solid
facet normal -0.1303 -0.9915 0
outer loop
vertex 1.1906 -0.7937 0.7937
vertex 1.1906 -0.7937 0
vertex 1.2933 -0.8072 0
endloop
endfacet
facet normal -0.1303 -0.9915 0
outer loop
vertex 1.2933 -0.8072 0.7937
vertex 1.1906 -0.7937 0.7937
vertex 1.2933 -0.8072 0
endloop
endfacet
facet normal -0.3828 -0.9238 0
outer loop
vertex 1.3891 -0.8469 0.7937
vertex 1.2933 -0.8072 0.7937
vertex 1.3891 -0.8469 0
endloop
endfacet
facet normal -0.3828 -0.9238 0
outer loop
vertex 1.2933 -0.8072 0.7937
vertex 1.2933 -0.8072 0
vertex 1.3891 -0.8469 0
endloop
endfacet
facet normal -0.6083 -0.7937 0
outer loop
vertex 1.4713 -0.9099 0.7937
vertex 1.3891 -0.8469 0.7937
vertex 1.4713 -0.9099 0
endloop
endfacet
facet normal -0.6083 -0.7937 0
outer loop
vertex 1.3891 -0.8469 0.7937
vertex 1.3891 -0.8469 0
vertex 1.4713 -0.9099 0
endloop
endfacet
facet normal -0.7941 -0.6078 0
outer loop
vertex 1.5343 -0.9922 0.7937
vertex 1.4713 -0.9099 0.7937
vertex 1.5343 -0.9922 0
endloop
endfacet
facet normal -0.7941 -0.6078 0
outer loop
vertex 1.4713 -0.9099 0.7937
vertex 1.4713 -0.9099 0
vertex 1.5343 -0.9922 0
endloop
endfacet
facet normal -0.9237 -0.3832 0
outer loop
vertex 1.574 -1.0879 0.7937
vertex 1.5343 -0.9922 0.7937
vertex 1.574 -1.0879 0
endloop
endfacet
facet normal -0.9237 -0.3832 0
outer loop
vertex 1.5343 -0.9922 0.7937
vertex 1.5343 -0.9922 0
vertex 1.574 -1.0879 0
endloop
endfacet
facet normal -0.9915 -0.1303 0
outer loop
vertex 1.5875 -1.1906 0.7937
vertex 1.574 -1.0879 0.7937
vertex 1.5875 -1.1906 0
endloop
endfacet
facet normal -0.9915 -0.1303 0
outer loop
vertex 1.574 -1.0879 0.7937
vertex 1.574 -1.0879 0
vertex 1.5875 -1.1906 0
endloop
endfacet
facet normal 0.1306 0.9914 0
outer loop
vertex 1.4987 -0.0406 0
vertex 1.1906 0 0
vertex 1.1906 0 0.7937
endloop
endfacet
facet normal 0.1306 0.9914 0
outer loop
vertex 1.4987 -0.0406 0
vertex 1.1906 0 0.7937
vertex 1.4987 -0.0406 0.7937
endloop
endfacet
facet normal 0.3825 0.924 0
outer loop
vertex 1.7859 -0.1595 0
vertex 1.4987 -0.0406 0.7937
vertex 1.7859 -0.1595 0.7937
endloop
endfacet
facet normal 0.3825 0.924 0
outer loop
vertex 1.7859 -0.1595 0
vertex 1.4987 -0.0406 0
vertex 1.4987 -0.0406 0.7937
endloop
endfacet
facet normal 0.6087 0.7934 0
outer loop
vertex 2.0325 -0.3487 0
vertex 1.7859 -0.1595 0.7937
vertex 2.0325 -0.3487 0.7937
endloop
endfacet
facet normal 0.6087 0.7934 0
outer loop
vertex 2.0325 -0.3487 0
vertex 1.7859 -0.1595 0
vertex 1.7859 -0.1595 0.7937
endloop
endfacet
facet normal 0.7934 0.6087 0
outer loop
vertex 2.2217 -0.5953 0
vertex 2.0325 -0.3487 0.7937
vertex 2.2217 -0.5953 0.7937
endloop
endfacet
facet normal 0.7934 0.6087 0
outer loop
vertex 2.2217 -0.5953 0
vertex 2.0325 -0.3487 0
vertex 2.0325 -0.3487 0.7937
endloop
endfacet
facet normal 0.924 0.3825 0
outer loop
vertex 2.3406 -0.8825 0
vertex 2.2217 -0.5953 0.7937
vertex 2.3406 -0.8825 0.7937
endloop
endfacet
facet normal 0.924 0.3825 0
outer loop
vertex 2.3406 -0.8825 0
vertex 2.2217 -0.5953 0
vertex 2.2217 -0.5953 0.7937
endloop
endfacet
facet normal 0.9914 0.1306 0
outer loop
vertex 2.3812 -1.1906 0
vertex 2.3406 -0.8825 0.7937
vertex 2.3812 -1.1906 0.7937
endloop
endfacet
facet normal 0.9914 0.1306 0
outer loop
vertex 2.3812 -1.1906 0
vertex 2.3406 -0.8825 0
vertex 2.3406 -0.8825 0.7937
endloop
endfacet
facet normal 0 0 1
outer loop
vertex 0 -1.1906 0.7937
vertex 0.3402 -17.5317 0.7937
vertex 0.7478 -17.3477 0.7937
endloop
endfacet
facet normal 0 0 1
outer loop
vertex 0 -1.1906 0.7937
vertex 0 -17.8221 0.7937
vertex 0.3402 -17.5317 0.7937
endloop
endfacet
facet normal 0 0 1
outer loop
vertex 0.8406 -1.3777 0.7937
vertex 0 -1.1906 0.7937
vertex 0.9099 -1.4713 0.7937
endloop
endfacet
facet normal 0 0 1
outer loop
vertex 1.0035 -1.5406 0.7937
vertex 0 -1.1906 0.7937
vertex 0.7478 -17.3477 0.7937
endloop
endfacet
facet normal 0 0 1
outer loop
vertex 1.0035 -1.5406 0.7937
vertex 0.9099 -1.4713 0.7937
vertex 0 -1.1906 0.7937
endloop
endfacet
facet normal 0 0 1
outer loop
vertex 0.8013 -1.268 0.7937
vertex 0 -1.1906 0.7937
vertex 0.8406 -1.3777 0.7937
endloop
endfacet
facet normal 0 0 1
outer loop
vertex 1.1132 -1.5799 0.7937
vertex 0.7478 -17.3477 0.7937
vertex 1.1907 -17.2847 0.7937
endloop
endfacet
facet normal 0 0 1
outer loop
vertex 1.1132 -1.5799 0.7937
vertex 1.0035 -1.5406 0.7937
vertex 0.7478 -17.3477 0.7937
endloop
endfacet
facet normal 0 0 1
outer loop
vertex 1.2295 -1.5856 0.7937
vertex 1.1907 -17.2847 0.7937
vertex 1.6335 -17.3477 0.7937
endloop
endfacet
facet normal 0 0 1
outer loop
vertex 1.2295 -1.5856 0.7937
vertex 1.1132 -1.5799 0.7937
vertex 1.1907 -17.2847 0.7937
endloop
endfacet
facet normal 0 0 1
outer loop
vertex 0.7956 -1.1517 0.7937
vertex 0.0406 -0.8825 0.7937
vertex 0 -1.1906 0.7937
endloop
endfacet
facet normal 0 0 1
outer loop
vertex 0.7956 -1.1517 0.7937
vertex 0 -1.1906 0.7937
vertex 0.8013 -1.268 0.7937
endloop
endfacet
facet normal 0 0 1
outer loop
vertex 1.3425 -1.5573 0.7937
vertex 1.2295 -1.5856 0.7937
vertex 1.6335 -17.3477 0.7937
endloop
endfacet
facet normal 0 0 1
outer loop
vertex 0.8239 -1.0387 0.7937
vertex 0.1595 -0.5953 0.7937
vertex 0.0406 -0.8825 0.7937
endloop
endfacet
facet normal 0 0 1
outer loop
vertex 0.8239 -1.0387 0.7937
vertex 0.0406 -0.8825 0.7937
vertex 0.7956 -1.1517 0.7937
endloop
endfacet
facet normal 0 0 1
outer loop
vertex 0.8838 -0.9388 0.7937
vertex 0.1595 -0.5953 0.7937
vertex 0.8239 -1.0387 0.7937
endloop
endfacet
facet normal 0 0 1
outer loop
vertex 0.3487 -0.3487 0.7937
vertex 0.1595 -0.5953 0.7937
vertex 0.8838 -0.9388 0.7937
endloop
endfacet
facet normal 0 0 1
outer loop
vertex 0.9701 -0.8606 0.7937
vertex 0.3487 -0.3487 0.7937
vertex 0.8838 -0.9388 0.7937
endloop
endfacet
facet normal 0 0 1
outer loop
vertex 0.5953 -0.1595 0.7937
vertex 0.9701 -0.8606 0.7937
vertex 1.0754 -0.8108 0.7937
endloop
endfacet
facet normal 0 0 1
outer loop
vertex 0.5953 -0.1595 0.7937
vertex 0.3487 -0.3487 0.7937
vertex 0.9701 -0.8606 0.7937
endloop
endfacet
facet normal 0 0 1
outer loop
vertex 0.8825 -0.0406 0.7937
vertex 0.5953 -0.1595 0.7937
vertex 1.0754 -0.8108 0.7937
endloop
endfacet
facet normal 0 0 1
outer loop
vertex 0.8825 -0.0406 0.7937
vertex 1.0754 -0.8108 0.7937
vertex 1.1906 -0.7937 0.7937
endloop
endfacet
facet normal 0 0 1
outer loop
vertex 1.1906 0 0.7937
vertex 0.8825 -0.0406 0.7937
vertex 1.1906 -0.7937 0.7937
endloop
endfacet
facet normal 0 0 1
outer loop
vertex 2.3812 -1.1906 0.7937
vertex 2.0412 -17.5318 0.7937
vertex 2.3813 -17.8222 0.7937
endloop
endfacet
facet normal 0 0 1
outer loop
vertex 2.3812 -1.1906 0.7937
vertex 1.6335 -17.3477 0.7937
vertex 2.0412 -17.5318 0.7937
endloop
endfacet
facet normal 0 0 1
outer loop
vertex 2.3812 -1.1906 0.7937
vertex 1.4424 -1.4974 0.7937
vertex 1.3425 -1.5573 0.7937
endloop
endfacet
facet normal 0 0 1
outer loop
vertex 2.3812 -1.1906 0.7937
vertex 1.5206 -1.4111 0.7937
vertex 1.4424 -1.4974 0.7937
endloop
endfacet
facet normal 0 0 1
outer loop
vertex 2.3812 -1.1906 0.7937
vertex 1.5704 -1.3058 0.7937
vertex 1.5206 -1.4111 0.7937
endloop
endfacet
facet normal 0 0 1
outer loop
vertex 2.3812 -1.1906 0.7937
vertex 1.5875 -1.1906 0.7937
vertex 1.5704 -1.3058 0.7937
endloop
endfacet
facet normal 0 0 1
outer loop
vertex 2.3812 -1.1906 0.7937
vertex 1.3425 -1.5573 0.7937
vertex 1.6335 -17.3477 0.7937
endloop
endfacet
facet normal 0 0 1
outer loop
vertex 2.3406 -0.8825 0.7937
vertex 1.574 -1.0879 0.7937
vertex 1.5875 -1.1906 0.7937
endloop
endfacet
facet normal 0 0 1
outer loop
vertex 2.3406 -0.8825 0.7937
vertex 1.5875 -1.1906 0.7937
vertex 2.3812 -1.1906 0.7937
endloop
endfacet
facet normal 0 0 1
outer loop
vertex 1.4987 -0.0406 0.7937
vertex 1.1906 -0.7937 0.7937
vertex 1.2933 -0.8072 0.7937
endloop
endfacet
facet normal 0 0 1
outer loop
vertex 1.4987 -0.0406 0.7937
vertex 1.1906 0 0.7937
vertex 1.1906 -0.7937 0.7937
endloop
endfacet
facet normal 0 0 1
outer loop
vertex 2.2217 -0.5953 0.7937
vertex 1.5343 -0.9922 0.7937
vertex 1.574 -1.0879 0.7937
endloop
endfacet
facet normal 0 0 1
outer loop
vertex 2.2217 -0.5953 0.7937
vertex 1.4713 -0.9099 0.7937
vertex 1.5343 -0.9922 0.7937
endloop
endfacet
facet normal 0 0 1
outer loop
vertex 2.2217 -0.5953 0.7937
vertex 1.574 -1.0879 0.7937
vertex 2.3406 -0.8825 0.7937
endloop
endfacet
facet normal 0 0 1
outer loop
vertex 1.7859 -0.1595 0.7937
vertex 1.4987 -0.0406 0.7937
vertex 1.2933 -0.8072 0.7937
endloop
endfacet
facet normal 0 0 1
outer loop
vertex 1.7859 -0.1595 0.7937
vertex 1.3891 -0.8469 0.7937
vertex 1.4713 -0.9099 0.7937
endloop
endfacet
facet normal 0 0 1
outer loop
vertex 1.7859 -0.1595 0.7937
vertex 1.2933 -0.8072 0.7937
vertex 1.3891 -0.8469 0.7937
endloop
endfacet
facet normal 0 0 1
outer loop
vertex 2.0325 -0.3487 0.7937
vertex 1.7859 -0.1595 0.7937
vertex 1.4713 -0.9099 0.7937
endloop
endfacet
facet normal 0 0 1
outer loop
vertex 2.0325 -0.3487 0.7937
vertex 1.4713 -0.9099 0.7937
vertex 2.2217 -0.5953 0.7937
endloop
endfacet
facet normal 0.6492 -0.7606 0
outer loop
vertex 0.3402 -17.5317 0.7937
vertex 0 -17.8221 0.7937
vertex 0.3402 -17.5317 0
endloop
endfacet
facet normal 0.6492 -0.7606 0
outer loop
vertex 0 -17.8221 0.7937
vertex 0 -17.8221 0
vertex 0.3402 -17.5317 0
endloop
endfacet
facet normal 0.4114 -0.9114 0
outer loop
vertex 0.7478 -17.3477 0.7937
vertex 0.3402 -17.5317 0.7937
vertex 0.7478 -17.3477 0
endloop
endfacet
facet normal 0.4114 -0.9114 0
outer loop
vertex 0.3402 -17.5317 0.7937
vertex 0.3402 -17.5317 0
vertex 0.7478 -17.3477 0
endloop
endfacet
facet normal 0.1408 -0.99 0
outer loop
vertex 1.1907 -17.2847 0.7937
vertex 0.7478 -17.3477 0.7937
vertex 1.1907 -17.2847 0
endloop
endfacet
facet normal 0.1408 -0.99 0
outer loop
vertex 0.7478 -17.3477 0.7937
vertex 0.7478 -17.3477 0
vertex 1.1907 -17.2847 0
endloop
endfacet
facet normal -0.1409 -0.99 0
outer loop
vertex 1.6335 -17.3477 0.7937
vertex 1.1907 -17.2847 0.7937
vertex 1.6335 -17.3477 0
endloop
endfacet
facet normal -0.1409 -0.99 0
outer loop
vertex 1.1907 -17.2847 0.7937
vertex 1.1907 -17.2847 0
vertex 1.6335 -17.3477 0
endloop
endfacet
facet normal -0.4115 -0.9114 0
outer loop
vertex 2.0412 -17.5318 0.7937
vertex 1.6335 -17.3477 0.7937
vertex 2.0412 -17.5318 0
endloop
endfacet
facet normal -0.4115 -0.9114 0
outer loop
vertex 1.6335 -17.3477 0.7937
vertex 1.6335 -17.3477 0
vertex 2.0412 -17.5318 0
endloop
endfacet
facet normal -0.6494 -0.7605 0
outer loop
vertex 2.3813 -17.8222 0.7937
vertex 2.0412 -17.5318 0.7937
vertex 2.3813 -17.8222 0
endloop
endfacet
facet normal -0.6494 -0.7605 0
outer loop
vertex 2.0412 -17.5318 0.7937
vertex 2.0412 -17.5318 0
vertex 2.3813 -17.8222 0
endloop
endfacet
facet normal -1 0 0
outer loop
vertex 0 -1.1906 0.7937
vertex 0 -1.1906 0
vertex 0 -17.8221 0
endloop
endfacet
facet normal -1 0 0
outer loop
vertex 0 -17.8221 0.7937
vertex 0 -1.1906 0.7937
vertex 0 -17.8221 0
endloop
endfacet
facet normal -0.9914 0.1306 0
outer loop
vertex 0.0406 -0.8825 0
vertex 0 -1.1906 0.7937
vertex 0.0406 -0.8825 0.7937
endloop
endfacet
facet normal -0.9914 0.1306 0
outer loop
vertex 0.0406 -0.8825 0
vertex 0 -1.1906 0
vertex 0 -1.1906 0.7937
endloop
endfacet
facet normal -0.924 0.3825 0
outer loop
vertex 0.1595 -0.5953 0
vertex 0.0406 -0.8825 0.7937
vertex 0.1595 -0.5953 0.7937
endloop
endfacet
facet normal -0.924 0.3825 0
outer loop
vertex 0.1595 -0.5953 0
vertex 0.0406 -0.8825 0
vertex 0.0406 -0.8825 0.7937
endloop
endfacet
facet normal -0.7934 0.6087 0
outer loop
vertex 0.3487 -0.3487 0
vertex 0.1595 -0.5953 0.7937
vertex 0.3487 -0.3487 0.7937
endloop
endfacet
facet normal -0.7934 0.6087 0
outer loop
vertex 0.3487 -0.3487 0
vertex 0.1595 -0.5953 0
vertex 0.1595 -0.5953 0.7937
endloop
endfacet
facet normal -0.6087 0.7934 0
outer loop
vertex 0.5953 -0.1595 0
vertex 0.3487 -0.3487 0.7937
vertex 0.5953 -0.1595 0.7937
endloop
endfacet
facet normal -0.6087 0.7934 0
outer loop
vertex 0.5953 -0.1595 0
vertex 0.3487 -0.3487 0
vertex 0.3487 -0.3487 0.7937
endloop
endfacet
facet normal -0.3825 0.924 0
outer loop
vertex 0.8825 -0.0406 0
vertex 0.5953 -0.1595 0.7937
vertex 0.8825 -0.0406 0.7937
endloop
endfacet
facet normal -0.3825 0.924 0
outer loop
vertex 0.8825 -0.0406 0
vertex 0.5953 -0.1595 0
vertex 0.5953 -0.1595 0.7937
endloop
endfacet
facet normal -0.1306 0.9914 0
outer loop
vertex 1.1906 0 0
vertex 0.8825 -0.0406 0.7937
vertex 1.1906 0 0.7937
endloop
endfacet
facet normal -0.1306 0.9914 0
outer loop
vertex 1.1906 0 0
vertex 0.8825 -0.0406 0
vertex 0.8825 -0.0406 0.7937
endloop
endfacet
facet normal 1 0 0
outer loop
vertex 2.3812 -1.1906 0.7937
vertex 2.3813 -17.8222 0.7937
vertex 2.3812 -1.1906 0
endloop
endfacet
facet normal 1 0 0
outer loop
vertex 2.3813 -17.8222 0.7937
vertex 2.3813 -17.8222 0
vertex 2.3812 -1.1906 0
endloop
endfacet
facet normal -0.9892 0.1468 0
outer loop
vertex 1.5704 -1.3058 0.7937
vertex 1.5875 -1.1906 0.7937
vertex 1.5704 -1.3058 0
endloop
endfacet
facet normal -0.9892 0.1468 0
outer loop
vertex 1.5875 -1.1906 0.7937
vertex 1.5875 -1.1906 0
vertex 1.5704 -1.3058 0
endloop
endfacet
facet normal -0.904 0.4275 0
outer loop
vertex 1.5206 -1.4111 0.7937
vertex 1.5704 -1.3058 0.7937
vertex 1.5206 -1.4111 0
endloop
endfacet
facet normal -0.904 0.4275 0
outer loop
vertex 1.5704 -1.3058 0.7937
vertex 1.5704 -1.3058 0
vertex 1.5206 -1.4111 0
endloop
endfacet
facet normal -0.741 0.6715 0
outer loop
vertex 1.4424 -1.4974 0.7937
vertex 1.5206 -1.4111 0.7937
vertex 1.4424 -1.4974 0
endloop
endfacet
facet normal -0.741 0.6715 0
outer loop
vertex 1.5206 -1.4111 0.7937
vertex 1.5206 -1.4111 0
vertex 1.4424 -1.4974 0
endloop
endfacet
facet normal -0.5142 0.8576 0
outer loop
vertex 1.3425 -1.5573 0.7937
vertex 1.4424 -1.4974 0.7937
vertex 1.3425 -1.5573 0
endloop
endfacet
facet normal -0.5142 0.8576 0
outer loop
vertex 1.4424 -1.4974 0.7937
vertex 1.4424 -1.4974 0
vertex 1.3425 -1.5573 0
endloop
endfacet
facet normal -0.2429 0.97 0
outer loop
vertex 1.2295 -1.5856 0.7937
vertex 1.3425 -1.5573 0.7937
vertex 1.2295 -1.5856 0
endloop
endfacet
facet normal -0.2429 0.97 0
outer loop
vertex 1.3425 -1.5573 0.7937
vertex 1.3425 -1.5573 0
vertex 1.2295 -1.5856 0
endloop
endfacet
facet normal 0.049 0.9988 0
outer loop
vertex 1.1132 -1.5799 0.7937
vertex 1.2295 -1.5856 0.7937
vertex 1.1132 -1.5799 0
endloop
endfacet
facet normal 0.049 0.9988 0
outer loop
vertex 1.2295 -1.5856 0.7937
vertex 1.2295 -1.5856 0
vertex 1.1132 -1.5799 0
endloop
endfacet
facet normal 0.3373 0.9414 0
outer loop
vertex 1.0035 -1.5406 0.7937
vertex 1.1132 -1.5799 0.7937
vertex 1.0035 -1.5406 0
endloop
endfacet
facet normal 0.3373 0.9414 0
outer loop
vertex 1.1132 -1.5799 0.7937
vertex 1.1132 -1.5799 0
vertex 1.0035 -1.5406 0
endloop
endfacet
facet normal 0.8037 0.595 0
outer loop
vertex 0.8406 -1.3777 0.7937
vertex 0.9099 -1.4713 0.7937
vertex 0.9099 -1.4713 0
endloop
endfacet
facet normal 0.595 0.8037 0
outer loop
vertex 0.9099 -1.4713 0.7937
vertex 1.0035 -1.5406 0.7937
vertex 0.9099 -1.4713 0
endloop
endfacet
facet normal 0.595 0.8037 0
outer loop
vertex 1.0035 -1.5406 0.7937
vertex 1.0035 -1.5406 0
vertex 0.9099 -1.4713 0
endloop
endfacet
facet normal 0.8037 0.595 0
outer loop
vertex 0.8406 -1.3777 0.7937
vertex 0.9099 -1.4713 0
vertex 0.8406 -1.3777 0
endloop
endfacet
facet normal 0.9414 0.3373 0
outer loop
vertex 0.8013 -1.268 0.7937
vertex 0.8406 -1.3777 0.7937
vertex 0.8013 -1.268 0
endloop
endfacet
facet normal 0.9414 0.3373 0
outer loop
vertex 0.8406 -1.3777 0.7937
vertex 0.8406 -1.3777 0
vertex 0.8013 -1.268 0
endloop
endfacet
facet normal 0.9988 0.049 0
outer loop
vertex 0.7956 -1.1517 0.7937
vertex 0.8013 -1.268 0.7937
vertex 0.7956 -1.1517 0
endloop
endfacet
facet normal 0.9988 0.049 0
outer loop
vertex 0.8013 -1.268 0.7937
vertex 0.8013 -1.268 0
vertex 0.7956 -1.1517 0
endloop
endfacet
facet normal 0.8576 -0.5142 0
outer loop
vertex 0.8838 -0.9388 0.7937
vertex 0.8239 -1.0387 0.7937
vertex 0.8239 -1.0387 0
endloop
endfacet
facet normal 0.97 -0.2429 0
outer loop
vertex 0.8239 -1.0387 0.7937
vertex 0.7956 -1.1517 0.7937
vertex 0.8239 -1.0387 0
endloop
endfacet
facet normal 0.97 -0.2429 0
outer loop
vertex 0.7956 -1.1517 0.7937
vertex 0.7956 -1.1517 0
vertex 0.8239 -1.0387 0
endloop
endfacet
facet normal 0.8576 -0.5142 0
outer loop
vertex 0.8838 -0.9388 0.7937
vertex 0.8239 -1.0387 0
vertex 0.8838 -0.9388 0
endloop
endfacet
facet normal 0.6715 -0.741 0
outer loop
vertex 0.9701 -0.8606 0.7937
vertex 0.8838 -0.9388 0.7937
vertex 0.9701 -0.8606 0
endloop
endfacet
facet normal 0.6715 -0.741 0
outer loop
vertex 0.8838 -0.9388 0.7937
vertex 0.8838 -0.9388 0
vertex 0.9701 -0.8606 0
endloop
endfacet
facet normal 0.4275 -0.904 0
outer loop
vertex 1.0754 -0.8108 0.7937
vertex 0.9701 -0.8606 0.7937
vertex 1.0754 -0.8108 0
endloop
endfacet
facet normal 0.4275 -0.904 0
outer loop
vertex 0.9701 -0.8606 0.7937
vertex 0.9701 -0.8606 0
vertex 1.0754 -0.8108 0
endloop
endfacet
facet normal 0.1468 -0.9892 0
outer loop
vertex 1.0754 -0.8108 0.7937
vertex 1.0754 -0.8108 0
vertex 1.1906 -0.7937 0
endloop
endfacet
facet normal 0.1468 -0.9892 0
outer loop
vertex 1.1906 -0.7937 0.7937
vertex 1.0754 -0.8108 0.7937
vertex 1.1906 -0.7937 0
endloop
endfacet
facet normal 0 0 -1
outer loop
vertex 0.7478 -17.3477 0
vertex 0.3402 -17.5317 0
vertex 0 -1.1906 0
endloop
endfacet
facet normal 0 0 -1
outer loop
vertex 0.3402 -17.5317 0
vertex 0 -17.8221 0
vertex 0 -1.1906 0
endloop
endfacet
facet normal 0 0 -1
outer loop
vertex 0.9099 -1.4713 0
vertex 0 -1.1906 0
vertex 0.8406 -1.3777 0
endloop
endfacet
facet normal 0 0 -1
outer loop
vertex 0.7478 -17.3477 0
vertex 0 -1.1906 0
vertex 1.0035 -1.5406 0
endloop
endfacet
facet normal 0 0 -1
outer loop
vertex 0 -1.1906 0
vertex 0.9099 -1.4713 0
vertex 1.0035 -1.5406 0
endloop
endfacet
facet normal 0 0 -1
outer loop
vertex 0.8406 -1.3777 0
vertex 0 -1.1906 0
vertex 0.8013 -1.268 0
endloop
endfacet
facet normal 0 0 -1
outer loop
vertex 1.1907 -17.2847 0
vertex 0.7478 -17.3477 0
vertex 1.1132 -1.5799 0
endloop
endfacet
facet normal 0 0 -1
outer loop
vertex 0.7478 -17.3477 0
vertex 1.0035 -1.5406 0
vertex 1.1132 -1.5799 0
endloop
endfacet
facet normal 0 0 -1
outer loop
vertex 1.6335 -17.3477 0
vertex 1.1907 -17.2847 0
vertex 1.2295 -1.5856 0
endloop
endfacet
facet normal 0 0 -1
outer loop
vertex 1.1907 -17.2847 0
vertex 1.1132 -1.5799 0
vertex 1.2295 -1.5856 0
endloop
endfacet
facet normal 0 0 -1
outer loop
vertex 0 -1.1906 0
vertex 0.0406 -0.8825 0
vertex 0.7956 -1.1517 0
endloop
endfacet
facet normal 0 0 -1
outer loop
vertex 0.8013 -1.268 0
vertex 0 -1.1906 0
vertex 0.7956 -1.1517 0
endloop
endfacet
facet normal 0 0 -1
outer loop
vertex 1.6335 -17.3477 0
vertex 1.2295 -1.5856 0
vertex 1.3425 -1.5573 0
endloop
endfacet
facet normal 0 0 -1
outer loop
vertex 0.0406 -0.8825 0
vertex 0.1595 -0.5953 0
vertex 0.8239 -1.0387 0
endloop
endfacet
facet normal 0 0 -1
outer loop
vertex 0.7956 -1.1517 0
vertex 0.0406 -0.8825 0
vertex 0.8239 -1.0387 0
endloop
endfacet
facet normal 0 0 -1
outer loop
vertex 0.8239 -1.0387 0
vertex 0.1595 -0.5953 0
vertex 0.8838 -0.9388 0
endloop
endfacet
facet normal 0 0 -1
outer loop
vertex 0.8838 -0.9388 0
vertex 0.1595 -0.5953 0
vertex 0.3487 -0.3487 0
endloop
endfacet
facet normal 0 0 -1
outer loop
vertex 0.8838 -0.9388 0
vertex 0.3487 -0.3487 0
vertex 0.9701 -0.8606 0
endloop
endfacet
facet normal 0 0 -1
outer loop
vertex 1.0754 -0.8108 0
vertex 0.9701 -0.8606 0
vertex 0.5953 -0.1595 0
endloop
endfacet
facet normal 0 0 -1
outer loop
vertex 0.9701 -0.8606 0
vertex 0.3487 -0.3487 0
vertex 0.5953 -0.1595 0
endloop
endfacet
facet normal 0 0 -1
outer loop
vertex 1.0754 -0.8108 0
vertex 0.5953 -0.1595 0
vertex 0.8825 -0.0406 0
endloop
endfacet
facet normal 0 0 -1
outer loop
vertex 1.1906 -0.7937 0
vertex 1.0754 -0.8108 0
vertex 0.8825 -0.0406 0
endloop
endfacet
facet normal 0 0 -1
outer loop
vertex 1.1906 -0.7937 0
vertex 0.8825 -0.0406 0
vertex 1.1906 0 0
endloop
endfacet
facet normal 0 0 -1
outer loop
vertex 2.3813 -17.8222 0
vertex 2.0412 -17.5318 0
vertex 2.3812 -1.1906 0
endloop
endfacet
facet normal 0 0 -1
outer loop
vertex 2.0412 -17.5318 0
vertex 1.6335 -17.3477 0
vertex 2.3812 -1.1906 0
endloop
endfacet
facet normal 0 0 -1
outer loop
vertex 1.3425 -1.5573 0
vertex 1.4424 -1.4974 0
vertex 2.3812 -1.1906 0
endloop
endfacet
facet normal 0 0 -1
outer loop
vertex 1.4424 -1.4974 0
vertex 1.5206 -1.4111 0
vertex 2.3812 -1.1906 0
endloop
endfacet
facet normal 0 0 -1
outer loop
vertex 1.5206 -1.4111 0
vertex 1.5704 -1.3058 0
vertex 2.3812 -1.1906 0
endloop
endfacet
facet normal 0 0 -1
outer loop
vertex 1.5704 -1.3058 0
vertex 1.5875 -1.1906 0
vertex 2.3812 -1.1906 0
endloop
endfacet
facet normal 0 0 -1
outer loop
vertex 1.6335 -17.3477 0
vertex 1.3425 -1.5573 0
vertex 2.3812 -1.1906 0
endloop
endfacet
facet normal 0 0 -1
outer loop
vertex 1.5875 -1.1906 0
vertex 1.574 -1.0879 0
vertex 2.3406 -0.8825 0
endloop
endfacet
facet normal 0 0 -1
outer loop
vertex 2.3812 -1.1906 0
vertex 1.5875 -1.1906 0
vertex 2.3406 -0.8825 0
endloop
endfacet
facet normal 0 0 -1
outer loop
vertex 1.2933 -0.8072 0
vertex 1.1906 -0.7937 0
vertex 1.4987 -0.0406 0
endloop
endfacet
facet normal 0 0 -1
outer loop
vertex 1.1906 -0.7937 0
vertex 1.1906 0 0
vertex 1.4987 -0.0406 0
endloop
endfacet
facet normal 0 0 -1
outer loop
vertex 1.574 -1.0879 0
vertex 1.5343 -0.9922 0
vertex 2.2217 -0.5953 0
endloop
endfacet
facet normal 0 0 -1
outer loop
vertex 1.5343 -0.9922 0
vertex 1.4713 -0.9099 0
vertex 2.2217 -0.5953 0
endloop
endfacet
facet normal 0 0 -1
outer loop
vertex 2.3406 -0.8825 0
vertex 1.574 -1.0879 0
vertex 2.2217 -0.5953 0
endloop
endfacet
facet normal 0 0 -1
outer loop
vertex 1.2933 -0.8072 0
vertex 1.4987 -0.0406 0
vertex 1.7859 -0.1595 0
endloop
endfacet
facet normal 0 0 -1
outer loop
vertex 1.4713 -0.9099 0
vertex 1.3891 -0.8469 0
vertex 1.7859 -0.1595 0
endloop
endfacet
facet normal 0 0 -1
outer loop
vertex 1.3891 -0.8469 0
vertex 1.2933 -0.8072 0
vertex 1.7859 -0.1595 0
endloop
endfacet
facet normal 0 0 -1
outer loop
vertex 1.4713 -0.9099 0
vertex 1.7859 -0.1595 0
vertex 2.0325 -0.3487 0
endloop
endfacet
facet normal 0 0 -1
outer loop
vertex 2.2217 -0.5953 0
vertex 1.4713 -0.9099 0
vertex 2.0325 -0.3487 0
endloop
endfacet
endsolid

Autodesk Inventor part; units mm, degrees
ref_plane "YZ Plane" through (0, 0, 0) normal (1, 0, 0) x (0, 1, 0)
ref_plane "XZ Plane" through (0, 0, 0) normal (0, 1, 0) x (-1, 0, 0)
ref_plane "XY Plane" through (0, 0, 0) normal (0, 0, 1) x (1, 0, 0)
sketch "Sketch1" plane through (0, 0, 0) normal (0, 0, 1) x (1, 0, 0)
  circle A0 centre (1.1906, -1.1906) radius 0.3969
  arc A1 (2.3812, -1.1906) -> (0, -1.1906) centre (1.1906, -1.1906) ccw
  line L0 (1.1906, -1.1906) -> (1.1906, 0)
  line L1 (0, 0) -> (0, -18.8722)
  line L2 (0, -18.8722) -> (2.3813, -18.8722)
  line L3 (2.3813, -18.8722) -> (2.3812, -1.1906)
  circle A2 centre (1.1906, -18.8722) radius 1.5875
  point P0 (1.1906, 0)
  point P1 (0, -1.1906)
  point P2 (0, -17.8222)
  point P3 (2.3813, -17.8222)
  point P4 (2.3813, -1.1906)
  dimension "d4" = 18.8722
  dimension "d5" = 3.175
extrude "Extrusion1" add sketch "Sketch1" along normal blind 0.7937 contours L3 A2 L1 A1
properties part number "Conn Rod Rod Portion"
